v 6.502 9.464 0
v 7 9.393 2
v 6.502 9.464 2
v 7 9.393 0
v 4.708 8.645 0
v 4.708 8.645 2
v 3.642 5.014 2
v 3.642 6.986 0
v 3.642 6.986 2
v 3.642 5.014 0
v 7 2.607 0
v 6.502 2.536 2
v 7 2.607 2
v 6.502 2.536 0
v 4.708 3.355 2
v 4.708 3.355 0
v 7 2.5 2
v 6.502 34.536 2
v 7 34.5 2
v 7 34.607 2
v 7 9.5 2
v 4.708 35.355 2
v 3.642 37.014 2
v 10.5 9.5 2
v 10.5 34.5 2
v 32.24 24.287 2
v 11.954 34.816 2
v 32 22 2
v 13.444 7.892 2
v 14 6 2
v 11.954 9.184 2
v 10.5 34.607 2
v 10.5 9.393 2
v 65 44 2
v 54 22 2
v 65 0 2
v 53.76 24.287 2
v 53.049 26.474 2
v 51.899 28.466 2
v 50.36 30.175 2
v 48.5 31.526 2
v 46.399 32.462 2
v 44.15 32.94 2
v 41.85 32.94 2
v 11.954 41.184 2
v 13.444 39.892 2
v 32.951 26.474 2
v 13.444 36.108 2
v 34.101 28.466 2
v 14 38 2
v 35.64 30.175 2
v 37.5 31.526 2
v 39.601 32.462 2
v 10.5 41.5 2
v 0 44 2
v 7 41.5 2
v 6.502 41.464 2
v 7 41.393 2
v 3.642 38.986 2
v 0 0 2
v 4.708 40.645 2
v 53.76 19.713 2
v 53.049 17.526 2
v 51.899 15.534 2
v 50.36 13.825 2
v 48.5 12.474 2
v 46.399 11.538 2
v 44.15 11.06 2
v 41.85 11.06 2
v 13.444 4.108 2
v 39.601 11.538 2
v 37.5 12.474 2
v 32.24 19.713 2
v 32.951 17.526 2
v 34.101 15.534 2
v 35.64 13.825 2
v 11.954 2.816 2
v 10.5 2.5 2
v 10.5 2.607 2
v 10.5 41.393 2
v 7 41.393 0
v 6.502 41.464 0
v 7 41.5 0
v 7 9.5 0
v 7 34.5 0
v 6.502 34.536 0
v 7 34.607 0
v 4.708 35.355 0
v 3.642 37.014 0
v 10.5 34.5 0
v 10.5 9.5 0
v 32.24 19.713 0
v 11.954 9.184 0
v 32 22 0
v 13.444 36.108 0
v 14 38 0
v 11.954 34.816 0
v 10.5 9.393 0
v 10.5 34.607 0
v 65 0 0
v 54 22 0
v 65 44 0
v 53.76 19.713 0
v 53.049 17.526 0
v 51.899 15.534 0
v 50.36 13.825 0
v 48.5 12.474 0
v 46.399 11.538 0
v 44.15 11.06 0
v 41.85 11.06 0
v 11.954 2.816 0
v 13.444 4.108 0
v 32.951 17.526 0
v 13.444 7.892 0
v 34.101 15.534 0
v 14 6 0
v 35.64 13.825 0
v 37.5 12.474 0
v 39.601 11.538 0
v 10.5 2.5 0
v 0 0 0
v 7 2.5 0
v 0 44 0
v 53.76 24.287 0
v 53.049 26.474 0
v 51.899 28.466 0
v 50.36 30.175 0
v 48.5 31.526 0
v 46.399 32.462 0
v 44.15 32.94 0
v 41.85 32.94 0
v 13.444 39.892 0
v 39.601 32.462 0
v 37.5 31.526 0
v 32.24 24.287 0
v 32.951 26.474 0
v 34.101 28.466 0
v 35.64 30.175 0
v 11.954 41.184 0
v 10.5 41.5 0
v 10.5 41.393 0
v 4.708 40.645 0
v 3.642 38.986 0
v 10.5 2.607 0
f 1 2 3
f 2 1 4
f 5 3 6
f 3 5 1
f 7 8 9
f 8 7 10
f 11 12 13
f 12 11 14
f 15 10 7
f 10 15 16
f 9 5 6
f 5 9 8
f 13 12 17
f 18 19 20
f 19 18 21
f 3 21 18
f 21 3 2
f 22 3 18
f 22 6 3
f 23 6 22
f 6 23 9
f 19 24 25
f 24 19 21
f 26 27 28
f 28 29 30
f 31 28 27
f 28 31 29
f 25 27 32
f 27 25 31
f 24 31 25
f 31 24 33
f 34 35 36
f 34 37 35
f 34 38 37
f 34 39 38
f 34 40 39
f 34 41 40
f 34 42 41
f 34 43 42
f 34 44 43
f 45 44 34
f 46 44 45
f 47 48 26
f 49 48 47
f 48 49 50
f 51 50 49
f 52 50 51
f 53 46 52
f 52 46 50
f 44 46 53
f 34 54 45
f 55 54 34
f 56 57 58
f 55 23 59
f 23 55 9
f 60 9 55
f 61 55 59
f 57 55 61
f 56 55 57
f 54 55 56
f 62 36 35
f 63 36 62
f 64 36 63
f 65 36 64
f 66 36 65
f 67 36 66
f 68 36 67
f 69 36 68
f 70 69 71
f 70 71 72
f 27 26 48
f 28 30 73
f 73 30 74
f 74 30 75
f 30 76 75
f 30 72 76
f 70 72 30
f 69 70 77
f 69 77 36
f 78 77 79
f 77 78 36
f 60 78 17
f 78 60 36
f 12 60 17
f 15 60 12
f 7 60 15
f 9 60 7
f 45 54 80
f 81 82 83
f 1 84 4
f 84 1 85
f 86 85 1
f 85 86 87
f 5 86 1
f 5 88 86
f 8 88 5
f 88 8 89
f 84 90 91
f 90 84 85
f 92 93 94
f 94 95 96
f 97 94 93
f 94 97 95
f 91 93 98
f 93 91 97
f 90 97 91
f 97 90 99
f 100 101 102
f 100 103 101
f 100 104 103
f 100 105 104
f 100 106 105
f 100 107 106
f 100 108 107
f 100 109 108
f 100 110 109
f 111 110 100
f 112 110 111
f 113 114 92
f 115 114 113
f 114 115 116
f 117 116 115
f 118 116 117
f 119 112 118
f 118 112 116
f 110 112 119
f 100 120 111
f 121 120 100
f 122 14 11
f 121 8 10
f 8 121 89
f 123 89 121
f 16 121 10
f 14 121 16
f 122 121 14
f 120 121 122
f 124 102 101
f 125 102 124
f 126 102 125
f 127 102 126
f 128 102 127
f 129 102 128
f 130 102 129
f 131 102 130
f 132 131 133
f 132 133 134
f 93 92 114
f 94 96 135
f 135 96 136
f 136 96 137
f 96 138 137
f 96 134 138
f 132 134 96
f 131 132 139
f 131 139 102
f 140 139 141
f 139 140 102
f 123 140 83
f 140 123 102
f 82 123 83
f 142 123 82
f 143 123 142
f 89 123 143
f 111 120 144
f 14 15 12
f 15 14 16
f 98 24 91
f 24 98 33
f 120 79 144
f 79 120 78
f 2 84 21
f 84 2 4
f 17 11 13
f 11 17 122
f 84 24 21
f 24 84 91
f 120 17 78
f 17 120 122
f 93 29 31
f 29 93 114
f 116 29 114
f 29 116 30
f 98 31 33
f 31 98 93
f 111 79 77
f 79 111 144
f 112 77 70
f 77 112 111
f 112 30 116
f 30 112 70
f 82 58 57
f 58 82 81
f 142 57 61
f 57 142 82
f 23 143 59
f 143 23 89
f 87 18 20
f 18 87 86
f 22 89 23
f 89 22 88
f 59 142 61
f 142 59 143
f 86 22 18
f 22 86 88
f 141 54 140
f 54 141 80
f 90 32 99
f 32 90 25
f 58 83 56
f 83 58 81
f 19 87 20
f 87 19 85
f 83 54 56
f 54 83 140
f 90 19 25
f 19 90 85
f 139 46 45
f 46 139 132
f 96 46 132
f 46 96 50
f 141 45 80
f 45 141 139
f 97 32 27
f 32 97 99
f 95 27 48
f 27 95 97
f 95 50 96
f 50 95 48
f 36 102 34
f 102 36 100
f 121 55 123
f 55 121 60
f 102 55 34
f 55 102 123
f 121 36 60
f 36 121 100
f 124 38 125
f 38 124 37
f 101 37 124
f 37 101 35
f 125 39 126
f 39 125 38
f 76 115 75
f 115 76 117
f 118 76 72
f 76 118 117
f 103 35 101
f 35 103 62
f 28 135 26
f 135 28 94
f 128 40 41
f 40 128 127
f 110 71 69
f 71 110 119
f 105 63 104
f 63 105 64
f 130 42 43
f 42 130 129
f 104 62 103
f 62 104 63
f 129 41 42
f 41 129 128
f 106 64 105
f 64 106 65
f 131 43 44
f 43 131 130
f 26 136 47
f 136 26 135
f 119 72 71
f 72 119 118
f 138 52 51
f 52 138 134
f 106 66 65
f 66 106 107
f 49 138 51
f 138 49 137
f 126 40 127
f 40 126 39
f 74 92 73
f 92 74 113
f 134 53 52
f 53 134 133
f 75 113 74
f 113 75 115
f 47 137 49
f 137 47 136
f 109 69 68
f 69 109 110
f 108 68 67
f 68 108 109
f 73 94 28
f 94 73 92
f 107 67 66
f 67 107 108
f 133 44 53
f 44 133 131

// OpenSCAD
hole_space=32;
hole=7;
gap=22;
height=44;
width=65;
depth=2;
button=22;

hole_bottom = (height-hole_space-7)/2;

difference(){
	cube([width,height,depth]);
	translate([3.5,hole_bottom,0]) union(){
		translate([hole/2,hole/2,0]) cylinder(d=hole,h=depth);
		translate([hole/2,0,0]) cube([hole/2,hole,depth]);
		translate([hole,hole/2,0]) cylinder(d=hole,h=depth);
	}
	translate([3.5,hole_bottom+hole_space,0]) union(){
		translate([hole/2,hole/2,0]) cylinder(d=hole,h=depth);
		translate([hole/2,0,0]) cube([hole/2,hole,depth]);
		translate([hole,hole/2,0]) cylinder(d=hole,h=depth);
	}
	translate([width-(height/2),height/2,0]) cylinder(d=button,h=depth);
}
